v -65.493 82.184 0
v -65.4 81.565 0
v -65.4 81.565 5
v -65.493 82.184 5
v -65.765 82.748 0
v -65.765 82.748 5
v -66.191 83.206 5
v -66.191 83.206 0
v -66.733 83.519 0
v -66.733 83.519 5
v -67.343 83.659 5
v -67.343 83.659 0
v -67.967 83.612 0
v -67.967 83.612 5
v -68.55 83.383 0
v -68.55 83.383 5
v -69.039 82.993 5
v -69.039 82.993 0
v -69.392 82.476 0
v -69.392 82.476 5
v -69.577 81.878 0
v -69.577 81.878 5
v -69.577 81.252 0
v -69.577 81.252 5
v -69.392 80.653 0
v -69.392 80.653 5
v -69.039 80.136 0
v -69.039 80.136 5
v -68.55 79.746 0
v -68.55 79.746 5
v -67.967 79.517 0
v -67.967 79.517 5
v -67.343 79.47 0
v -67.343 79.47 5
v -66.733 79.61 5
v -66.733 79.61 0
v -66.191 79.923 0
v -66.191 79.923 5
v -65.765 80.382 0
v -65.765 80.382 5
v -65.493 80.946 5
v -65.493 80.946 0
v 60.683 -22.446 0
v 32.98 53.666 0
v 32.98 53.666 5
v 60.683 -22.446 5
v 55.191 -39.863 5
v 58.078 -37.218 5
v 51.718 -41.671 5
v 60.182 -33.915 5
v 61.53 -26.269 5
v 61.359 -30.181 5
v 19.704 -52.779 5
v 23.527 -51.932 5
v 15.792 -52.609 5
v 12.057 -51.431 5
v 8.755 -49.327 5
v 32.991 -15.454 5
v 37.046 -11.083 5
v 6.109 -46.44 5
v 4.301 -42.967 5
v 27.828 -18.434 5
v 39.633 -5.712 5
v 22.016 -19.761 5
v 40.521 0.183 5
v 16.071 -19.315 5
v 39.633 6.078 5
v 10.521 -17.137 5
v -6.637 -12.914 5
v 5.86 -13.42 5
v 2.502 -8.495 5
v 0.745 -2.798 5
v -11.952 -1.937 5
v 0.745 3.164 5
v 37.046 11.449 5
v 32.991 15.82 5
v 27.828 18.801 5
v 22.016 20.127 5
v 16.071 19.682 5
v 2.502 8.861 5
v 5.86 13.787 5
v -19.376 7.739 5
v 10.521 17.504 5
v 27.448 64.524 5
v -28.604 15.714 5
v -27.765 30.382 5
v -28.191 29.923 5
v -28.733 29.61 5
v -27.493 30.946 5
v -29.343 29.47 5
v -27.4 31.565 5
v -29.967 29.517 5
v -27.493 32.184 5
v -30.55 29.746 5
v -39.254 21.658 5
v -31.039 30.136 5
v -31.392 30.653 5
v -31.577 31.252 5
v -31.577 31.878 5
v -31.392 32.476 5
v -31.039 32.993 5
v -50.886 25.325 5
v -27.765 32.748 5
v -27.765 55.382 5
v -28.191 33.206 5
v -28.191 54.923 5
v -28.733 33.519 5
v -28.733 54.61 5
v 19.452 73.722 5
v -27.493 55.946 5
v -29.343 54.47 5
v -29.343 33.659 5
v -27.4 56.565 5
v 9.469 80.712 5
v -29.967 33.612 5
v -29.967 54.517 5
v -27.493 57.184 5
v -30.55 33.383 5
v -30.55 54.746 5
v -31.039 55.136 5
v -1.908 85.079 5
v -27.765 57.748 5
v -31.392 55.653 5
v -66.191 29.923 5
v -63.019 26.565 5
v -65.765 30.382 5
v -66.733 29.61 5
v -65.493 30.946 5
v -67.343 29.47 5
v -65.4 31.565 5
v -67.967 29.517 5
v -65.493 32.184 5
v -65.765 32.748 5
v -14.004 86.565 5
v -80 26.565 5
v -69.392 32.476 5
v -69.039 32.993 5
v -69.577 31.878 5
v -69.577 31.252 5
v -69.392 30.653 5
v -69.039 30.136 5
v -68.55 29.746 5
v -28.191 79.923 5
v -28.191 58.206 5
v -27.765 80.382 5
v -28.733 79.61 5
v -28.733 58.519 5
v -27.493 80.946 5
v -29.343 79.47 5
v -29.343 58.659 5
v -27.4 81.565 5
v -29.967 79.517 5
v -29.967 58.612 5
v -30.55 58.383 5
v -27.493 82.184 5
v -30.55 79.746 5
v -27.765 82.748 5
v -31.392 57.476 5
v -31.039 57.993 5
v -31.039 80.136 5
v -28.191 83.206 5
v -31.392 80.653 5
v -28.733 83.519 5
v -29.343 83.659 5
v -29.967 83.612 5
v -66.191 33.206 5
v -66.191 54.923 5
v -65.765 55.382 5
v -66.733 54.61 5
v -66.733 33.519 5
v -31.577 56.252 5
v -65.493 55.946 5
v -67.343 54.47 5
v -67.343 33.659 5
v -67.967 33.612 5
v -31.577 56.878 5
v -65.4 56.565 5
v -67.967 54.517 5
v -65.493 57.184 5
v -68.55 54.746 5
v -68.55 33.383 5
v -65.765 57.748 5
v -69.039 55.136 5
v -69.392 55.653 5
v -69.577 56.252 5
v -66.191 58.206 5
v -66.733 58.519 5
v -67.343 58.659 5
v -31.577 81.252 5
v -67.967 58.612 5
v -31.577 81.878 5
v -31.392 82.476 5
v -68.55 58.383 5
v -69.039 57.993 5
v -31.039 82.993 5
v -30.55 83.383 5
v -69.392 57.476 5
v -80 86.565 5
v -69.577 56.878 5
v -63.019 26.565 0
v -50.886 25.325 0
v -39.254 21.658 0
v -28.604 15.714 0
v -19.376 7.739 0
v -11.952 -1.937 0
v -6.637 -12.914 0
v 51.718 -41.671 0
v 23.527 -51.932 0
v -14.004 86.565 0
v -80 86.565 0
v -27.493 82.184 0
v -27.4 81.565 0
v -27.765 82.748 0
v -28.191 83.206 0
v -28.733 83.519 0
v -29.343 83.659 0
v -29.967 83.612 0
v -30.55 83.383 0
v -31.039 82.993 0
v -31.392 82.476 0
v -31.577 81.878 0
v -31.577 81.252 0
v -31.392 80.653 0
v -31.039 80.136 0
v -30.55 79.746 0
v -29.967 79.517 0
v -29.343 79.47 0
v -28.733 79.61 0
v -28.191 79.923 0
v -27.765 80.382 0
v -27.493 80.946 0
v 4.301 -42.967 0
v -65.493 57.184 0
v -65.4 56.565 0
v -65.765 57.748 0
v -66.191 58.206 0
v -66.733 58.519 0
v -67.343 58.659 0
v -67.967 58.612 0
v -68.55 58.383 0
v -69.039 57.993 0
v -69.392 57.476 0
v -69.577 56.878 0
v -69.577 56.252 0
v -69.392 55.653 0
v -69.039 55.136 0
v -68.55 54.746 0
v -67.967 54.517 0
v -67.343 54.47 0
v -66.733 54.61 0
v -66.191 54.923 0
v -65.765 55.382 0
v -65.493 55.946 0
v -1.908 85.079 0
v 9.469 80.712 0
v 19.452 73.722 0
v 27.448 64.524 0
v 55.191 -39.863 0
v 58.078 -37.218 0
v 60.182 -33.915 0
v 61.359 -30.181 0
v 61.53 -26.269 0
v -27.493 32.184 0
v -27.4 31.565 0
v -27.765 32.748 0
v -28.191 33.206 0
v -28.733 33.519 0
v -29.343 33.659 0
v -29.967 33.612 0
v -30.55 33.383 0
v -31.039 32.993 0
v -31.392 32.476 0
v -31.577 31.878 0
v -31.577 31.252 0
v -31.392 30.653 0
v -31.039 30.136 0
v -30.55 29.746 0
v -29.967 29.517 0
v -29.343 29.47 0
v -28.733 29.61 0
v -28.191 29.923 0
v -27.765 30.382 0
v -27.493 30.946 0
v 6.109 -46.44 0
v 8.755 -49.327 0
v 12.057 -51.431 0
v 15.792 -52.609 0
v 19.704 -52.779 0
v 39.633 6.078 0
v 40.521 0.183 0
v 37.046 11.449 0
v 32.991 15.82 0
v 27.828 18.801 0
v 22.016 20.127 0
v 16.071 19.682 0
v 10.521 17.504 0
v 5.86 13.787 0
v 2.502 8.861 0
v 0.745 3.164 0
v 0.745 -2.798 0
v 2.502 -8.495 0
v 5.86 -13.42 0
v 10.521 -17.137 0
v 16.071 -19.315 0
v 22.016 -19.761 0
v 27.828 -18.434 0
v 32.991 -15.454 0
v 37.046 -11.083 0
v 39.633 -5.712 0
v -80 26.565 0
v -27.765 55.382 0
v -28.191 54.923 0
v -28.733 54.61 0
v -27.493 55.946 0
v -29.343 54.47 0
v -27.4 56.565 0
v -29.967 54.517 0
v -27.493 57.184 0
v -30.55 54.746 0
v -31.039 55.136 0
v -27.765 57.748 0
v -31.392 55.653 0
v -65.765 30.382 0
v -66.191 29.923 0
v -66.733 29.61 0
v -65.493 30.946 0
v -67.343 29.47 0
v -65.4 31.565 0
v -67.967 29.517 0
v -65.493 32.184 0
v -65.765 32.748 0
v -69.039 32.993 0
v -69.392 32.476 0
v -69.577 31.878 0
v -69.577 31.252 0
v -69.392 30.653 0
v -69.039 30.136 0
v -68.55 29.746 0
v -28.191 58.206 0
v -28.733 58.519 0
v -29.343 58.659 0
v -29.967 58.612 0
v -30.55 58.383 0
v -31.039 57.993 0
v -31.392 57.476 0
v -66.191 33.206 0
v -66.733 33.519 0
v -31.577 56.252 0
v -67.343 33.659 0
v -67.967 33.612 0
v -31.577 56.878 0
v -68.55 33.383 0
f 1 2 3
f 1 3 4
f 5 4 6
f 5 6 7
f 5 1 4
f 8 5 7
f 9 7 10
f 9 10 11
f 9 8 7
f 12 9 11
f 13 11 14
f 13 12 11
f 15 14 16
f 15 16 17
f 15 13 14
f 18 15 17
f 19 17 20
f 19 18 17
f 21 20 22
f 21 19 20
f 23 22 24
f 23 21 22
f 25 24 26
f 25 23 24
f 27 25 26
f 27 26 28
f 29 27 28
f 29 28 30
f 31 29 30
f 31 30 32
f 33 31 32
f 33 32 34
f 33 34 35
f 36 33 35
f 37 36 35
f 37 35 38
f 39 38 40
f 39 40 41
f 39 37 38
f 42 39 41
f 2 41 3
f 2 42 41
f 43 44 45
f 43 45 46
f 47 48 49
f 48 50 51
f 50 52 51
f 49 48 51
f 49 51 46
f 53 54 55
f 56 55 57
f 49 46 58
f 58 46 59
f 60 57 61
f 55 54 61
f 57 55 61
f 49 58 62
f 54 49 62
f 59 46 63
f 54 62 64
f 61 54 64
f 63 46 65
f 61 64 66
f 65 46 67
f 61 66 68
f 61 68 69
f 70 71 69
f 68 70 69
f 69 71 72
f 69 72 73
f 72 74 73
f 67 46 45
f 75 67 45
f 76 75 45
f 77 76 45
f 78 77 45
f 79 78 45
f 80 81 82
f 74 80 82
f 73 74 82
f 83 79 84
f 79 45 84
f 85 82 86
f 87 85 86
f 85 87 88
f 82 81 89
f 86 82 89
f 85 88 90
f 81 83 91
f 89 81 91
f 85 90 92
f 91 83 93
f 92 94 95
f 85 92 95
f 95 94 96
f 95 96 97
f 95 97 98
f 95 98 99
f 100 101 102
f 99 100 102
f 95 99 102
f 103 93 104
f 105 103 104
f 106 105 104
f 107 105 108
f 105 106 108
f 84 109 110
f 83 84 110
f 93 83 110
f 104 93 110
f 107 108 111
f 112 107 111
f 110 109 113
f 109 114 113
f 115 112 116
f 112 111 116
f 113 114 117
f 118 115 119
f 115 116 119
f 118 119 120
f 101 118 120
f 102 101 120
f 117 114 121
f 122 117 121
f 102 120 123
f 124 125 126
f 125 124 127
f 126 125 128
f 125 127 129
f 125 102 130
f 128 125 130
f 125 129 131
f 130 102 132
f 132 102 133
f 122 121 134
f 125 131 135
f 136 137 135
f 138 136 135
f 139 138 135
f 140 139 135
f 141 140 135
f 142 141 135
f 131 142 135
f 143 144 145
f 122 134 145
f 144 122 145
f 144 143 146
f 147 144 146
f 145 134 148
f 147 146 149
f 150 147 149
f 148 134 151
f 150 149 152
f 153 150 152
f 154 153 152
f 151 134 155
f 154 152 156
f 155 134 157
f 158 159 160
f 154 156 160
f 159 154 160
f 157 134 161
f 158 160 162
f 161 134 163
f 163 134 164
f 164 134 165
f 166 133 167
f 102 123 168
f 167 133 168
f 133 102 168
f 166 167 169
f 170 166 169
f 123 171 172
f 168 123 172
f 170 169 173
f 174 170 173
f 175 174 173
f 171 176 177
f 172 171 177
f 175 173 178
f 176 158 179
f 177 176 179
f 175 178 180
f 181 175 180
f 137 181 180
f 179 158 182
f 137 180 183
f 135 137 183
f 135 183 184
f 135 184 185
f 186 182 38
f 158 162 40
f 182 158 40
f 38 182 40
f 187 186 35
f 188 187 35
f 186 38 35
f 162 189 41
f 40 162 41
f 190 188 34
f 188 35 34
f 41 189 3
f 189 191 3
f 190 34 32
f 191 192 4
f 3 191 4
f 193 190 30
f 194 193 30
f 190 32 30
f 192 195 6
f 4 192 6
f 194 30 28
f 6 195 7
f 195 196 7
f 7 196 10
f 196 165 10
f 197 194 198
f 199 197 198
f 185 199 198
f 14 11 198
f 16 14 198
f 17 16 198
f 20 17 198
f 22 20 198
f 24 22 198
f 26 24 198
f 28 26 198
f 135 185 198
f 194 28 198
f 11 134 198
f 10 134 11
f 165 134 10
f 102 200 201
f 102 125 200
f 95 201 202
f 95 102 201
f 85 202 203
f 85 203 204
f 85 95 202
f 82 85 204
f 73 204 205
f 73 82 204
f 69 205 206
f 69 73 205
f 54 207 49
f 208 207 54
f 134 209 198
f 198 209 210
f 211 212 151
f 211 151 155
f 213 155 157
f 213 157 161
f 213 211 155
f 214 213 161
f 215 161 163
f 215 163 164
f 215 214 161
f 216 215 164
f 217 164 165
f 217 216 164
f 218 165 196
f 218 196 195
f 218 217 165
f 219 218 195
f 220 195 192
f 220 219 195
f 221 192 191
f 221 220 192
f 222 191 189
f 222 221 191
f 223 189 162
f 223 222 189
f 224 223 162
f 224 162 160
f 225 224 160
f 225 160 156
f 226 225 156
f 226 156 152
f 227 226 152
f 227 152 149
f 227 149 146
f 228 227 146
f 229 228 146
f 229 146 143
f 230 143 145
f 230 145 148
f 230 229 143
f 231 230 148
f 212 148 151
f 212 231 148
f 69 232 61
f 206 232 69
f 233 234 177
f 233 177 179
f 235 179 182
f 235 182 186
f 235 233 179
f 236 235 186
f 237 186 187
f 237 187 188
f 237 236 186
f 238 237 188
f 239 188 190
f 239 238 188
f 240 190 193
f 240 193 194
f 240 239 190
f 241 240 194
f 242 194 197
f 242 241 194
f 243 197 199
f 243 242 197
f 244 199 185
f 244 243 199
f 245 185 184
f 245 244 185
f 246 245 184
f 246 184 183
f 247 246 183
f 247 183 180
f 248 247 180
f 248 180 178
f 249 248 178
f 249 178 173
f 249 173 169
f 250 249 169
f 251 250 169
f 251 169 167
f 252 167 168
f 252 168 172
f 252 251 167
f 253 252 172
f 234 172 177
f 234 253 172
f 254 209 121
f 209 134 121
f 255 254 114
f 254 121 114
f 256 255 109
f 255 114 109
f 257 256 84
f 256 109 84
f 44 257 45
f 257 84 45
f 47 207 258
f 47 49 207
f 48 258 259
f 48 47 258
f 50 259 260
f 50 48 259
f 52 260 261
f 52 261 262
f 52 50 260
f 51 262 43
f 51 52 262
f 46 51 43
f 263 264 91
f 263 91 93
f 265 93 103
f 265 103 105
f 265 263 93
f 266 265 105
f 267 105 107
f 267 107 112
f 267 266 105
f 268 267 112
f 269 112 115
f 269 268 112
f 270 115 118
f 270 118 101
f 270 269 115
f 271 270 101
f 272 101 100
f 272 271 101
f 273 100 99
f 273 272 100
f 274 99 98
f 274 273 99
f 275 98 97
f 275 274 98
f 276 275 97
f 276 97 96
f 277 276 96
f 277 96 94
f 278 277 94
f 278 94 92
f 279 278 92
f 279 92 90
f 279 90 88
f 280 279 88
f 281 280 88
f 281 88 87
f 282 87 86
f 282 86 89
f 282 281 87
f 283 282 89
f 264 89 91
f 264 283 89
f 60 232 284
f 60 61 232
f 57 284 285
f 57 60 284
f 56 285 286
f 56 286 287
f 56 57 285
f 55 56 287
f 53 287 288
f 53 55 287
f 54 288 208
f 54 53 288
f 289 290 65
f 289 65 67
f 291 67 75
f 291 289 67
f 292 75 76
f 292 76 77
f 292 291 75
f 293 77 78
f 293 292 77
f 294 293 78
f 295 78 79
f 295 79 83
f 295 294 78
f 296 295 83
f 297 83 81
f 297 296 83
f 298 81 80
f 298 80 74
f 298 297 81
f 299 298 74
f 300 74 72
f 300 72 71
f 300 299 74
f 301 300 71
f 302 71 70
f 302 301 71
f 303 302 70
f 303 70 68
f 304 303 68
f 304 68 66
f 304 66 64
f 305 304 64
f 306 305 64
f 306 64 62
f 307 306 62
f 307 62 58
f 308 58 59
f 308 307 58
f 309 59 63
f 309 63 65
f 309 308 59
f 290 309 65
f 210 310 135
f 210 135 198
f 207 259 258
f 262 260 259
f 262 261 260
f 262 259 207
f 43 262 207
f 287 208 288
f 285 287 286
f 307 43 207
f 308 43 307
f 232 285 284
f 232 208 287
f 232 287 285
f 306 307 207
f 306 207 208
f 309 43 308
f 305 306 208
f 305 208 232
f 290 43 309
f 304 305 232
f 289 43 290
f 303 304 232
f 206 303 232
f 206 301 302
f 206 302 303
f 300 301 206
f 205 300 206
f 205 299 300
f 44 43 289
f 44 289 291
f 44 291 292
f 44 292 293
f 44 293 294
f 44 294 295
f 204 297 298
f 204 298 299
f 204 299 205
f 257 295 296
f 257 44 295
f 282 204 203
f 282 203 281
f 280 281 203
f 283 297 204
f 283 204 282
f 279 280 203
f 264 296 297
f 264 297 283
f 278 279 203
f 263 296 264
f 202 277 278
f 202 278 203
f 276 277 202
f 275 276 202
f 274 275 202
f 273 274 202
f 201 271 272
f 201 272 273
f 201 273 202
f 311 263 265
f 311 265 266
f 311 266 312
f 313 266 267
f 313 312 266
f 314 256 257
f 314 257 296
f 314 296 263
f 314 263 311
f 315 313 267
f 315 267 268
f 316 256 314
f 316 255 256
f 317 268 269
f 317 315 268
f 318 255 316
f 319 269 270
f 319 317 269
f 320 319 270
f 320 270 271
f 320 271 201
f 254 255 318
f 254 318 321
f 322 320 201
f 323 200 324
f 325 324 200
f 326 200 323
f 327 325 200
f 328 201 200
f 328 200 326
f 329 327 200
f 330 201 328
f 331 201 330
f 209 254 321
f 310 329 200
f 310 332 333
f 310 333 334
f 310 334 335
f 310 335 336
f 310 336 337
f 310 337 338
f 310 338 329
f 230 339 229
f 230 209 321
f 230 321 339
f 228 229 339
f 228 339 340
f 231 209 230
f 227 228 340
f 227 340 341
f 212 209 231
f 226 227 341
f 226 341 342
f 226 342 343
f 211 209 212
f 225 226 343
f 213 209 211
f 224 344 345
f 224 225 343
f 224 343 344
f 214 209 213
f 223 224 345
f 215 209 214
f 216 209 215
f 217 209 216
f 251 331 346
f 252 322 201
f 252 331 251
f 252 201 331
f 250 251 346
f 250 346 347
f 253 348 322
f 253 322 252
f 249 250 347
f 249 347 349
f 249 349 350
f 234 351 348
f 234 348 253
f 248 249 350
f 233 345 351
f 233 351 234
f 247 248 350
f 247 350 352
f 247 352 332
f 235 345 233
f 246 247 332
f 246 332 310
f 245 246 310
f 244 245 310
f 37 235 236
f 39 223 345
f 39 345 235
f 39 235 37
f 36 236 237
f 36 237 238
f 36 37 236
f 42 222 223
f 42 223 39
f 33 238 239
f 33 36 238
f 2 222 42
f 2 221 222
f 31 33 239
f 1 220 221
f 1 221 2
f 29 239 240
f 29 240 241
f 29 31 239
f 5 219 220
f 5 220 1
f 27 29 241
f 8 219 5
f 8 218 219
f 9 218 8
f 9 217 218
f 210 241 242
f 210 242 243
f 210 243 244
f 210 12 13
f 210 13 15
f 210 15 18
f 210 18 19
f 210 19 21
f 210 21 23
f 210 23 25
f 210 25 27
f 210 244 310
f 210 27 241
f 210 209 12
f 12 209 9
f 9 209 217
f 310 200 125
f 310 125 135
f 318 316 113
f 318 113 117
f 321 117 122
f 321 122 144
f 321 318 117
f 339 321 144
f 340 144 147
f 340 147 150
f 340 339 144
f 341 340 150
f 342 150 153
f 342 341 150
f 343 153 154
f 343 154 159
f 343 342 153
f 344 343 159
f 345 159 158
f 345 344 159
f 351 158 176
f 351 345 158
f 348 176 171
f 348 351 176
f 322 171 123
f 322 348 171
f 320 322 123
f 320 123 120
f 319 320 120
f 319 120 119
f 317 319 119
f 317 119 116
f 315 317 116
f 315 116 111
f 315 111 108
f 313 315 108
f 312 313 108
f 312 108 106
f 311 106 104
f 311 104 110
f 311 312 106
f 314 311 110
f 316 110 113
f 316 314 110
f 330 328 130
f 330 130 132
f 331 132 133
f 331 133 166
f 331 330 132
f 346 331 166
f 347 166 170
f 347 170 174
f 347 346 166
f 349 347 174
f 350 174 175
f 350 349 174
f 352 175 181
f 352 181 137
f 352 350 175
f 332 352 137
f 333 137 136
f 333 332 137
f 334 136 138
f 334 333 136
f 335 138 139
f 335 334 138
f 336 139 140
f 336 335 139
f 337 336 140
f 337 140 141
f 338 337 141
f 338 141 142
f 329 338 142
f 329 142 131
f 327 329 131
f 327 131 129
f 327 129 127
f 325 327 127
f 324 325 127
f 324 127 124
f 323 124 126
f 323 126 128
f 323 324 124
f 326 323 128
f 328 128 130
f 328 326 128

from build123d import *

# Parameters (mm, degrees)
SKETCH1_R           = 20
SKETCH1_R_2         = 2.1
BOSS_EXTRUDE1_DEPTH = 5
FILLET1_R           = 50
FILLET2_R           = 60
FILLET3_R           = 15


with BuildPart() as part:
    # Sketch1 → Boss-Extrude1 (new body)
    with BuildSketch(Plane.XY):
        Polygon((-80, 26.564623636), (-80, 86.564623636), (0, 86.564623636), (21.006226146, 86.564623636), (65.812994389, -36.540960351), (9.431437142, -57.06216895), (-21.006226146, 26.564623636), align=None)
        with Locations((20.5212086, 0.183066389)):
            Circle(SKETCH1_R, mode=Mode.SUBTRACT)
        with Locations((-67.5, 81.564623636)):
            Circle(SKETCH1_R_2, mode=Mode.SUBTRACT)
        with Locations((-67.5, 56.564623636)):
            Circle(SKETCH1_R_2, mode=Mode.SUBTRACT)
        with Locations((-67.5, 31.564623636)):
            Circle(SKETCH1_R_2, mode=Mode.SUBTRACT)
        with Locations((-29.5, 81.564623636)):
            Circle(SKETCH1_R_2, mode=Mode.SUBTRACT)
        with Locations((-29.5, 56.564623636)):
            Circle(SKETCH1_R_2, mode=Mode.SUBTRACT)
        with Locations((-29.5, 31.564623636)):
            Circle(SKETCH1_R_2, mode=Mode.SUBTRACT)
    extrude(amount=BOSS_EXTRUDE1_DEPTH)

    # Fillet1
    fillet1_edges = [part.edges().sort_by_distance(p)[0] for p in [
        (21.006226146, 86.564623636, 2.5),
    ]]
    fillet(fillet1_edges, radius=FILLET1_R)

    # Fillet2
    fillet2_edges = [part.edges().sort_by_distance(p)[0] for p in [
        (-21.006226146, 26.564623636, 2.5),
    ]]
    fillet(fillet2_edges, radius=FILLET2_R)

    # Fillet3
    fillet3_edges = [part.edges().sort_by_distance(p)[0] for p in [
        (65.812994389, -36.540960351, 2.5),
        (9.431437142, -57.06216895, 2.5),
    ]]
    fillet(fillet3_edges, radius=FILLET3_R)


solid = part.part
